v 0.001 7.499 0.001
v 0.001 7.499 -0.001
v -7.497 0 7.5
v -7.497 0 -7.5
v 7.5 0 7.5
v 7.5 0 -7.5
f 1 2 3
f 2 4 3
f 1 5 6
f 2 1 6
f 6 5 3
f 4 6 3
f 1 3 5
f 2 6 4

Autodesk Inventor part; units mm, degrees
sketch "Sketch1" plane through (0, 0, 0) normal (0, 1, 0) x (-1, 0, 0)
  line L0 (7.5, 7.5) -> (-7.5, 7.5)
  line L1 (-7.5, 7.5) -> (-7.5, -7.5)
  line L2 (-7.5, -7.5) -> (7.5, -7.5)
  line L3 (7.5, -7.5) -> (7.5, 7.5)
  line L4 (7.5, 7.5) -> (-7.5, -7.5) construction
  line L5 (-7.5, 7.5) -> (7.5, -7.5) construction
  point P0 (0, 0)
  dimension "d0" = 15
  dimension "d1" = 15
extrude "Extrusion1" add sketch "Sketch1" along normal blind 7.5
sketch "Sketch2" plane through (0, 7.5, 0) normal (0, 1, 0) x (1, 0, 0)
  point P0 (0, 0)
  point P1 (0, 0)
ref_plane "Work Plane1" through (7.5, 0, 7.5) normal (0.7071, 0.7071, 0) x (0, 0, -1)
ref_plane "Work Plane2" through (-7.5, 0, 7.5) normal (0, 0.7071, 0.7071) x (1, 0, 0)
ref_plane "Work Plane3" through (-7.5, 0, -7.5) normal (0.7071, -0.7071, 0) x (0.5774, 0.5774, 0.5774)
ref_plane "Work Plane4" through (7.5, 0, -7.5) normal (0, 0.7071, -0.7071) x (-1, 0, 0)
sketch "Sketch4" plane through (7.5, 0, 7.5) normal (0.7071, 0.7071, 0) x (0, 0, -1)
  line L0 (26.6476, 25.9998) -> (-15.2684, 25.9998)
  line L1 (-15.2684, 25.9998) -> (-15.2684, -13.1545)
  line L2 (-15.2684, -13.1545) -> (26.6476, -13.1545)
  line L3 (26.6476, -13.1545) -> (26.6476, 25.9998)
  point P0 (7.5, 5.3033)
extrude "Extrusion2" cut sketch "Sketch4" along normal through all
sketch "Sketch5" plane through (-7.5, 0, 7.5) normal (0, 0.7071, 0.7071) x (1, 0, 0)
  line L0 (25.5392, 33.5657) -> (-14.5967, 33.5657)
  line L1 (-14.5967, 33.5657) -> (-14.5967, -23.0742)
  line L2 (-14.5967, -23.0742) -> (25.5392, -23.0742)
  line L3 (25.5392, -23.0742) -> (25.5392, 33.5657)
  point P0 (7.5, 5.3033)
extrude "Extrusion3" cut sketch "Sketch5" along normal through all
sketch "Sketch6" plane through (-7.5, 0, -7.5) normal (0.7071, -0.7071, 0) x (0.5774, 0.5774, 0.5774)
  line L0 (35.4927, -22.9081) -> (-17.0623, -22.9081)
  line L1 (-17.0623, -22.9081) -> (-17.0623, 39.3429)
  line L2 (-17.0623, 39.3429) -> (35.4927, 39.3429)
  line L3 (35.4927, 39.3429) -> (35.4927, -22.9081)
  point P0 (8.6603, 3.0619)
extrude "Extrusion4" cut sketch "Sketch6" against normal blind 15
sketch "Sketch7" plane through (7.5, 0, -7.5) normal (0, 0.7071, -0.7071) x (-1, 0, 0)
  line L0 (-15.9671, 26.9617) -> (32.6533, 26.9617)
  line L1 (32.6533, 26.9617) -> (32.6533, -21.7992)
  line L2 (32.6533, -21.7992) -> (-15.9671, -21.7992)
  line L3 (-15.9671, -21.7992) -> (-15.9671, 26.9617)
  point P0 (7.5, 5.3033)
extrude "Extrusion5" cut sketch "Sketch7" along normal through all
equation "\"d0\" = 0.5 * BodyHeight"
equation "\"d1\" = 0.5 * BodyHeight"
equation "\"d2\" = 0.25 * BodyHeight"
equation "\"d8\" = 0.5 * BodyHeight"
equation "\"BodyHeight\" = 30"
properties part number "HexSideSpike" material "H TPU"
